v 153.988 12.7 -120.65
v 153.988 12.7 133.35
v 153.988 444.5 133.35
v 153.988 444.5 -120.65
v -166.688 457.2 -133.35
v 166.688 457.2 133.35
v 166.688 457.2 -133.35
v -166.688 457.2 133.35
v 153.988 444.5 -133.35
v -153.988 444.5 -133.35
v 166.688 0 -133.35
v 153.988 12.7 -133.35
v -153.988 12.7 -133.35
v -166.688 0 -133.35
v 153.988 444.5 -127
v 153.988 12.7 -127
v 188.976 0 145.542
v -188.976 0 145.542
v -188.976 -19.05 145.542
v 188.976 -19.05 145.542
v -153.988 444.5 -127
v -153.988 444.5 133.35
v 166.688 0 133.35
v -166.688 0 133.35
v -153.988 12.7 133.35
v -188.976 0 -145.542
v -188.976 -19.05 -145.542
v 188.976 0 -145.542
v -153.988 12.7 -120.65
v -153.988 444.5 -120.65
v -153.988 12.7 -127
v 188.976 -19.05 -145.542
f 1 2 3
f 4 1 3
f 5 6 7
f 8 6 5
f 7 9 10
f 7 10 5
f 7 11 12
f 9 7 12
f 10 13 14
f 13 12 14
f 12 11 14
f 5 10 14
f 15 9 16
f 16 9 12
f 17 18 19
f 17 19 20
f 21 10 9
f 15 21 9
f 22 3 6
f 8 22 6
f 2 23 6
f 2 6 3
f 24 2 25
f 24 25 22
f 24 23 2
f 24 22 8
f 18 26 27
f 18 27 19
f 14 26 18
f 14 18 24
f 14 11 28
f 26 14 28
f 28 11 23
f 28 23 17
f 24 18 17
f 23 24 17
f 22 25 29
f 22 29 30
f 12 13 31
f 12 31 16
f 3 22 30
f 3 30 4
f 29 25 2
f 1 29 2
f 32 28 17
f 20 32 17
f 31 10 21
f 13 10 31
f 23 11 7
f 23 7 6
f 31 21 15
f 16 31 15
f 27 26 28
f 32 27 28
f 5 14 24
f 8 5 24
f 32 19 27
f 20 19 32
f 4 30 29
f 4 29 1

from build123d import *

# Parameters (mm, degrees)
F0_W     = 377.952
F0_H     = 291.084
F1_DEPTH = 19.05
F2_W     = 333.375
F2_H     = 266.7
F3_DEPTH = 457.2
F4_W     = 307.975
F4_H     = 431.8
F5_DEPTH = 254
F6_W     = 307.975
F6_H     = 431.8
F7_DEPTH = 6.35


with BuildPart() as f1:
    # F0 (on Front) → F1 (new body)
    with BuildSketch(Plane.XZ):
        Rectangle(F0_W, F0_H)
    extrude(amount=F1_DEPTH)

    # F2 (on face) → F3 (join)
    with BuildSketch(Plane(origin=(0, 0, 0), x_dir=(-1, 0, 0), z_dir=(0, 1, 0))):
        Rectangle(F2_W, F2_H)
    extrude(amount=F3_DEPTH)

    # F4 (on face) → F5 (cut)
    with BuildSketch(Plane.XY.offset(133.35)):
        with Locations((0, 228.6)):
            Rectangle(F4_W, F4_H)
    extrude(amount=-F5_DEPTH, mode=Mode.SUBTRACT)

    # F6 (on face) → F7 (cut)
    with BuildSketch(Plane(origin=(0, 0, -133.35), x_dir=(1, 0, 0), z_dir=(0, 0, -1))):
        with Locations((0, -228.6)):
            Rectangle(F6_W, F6_H)
    extrude(amount=-F7_DEPTH, mode=Mode.SUBTRACT)


solid = f1.part
